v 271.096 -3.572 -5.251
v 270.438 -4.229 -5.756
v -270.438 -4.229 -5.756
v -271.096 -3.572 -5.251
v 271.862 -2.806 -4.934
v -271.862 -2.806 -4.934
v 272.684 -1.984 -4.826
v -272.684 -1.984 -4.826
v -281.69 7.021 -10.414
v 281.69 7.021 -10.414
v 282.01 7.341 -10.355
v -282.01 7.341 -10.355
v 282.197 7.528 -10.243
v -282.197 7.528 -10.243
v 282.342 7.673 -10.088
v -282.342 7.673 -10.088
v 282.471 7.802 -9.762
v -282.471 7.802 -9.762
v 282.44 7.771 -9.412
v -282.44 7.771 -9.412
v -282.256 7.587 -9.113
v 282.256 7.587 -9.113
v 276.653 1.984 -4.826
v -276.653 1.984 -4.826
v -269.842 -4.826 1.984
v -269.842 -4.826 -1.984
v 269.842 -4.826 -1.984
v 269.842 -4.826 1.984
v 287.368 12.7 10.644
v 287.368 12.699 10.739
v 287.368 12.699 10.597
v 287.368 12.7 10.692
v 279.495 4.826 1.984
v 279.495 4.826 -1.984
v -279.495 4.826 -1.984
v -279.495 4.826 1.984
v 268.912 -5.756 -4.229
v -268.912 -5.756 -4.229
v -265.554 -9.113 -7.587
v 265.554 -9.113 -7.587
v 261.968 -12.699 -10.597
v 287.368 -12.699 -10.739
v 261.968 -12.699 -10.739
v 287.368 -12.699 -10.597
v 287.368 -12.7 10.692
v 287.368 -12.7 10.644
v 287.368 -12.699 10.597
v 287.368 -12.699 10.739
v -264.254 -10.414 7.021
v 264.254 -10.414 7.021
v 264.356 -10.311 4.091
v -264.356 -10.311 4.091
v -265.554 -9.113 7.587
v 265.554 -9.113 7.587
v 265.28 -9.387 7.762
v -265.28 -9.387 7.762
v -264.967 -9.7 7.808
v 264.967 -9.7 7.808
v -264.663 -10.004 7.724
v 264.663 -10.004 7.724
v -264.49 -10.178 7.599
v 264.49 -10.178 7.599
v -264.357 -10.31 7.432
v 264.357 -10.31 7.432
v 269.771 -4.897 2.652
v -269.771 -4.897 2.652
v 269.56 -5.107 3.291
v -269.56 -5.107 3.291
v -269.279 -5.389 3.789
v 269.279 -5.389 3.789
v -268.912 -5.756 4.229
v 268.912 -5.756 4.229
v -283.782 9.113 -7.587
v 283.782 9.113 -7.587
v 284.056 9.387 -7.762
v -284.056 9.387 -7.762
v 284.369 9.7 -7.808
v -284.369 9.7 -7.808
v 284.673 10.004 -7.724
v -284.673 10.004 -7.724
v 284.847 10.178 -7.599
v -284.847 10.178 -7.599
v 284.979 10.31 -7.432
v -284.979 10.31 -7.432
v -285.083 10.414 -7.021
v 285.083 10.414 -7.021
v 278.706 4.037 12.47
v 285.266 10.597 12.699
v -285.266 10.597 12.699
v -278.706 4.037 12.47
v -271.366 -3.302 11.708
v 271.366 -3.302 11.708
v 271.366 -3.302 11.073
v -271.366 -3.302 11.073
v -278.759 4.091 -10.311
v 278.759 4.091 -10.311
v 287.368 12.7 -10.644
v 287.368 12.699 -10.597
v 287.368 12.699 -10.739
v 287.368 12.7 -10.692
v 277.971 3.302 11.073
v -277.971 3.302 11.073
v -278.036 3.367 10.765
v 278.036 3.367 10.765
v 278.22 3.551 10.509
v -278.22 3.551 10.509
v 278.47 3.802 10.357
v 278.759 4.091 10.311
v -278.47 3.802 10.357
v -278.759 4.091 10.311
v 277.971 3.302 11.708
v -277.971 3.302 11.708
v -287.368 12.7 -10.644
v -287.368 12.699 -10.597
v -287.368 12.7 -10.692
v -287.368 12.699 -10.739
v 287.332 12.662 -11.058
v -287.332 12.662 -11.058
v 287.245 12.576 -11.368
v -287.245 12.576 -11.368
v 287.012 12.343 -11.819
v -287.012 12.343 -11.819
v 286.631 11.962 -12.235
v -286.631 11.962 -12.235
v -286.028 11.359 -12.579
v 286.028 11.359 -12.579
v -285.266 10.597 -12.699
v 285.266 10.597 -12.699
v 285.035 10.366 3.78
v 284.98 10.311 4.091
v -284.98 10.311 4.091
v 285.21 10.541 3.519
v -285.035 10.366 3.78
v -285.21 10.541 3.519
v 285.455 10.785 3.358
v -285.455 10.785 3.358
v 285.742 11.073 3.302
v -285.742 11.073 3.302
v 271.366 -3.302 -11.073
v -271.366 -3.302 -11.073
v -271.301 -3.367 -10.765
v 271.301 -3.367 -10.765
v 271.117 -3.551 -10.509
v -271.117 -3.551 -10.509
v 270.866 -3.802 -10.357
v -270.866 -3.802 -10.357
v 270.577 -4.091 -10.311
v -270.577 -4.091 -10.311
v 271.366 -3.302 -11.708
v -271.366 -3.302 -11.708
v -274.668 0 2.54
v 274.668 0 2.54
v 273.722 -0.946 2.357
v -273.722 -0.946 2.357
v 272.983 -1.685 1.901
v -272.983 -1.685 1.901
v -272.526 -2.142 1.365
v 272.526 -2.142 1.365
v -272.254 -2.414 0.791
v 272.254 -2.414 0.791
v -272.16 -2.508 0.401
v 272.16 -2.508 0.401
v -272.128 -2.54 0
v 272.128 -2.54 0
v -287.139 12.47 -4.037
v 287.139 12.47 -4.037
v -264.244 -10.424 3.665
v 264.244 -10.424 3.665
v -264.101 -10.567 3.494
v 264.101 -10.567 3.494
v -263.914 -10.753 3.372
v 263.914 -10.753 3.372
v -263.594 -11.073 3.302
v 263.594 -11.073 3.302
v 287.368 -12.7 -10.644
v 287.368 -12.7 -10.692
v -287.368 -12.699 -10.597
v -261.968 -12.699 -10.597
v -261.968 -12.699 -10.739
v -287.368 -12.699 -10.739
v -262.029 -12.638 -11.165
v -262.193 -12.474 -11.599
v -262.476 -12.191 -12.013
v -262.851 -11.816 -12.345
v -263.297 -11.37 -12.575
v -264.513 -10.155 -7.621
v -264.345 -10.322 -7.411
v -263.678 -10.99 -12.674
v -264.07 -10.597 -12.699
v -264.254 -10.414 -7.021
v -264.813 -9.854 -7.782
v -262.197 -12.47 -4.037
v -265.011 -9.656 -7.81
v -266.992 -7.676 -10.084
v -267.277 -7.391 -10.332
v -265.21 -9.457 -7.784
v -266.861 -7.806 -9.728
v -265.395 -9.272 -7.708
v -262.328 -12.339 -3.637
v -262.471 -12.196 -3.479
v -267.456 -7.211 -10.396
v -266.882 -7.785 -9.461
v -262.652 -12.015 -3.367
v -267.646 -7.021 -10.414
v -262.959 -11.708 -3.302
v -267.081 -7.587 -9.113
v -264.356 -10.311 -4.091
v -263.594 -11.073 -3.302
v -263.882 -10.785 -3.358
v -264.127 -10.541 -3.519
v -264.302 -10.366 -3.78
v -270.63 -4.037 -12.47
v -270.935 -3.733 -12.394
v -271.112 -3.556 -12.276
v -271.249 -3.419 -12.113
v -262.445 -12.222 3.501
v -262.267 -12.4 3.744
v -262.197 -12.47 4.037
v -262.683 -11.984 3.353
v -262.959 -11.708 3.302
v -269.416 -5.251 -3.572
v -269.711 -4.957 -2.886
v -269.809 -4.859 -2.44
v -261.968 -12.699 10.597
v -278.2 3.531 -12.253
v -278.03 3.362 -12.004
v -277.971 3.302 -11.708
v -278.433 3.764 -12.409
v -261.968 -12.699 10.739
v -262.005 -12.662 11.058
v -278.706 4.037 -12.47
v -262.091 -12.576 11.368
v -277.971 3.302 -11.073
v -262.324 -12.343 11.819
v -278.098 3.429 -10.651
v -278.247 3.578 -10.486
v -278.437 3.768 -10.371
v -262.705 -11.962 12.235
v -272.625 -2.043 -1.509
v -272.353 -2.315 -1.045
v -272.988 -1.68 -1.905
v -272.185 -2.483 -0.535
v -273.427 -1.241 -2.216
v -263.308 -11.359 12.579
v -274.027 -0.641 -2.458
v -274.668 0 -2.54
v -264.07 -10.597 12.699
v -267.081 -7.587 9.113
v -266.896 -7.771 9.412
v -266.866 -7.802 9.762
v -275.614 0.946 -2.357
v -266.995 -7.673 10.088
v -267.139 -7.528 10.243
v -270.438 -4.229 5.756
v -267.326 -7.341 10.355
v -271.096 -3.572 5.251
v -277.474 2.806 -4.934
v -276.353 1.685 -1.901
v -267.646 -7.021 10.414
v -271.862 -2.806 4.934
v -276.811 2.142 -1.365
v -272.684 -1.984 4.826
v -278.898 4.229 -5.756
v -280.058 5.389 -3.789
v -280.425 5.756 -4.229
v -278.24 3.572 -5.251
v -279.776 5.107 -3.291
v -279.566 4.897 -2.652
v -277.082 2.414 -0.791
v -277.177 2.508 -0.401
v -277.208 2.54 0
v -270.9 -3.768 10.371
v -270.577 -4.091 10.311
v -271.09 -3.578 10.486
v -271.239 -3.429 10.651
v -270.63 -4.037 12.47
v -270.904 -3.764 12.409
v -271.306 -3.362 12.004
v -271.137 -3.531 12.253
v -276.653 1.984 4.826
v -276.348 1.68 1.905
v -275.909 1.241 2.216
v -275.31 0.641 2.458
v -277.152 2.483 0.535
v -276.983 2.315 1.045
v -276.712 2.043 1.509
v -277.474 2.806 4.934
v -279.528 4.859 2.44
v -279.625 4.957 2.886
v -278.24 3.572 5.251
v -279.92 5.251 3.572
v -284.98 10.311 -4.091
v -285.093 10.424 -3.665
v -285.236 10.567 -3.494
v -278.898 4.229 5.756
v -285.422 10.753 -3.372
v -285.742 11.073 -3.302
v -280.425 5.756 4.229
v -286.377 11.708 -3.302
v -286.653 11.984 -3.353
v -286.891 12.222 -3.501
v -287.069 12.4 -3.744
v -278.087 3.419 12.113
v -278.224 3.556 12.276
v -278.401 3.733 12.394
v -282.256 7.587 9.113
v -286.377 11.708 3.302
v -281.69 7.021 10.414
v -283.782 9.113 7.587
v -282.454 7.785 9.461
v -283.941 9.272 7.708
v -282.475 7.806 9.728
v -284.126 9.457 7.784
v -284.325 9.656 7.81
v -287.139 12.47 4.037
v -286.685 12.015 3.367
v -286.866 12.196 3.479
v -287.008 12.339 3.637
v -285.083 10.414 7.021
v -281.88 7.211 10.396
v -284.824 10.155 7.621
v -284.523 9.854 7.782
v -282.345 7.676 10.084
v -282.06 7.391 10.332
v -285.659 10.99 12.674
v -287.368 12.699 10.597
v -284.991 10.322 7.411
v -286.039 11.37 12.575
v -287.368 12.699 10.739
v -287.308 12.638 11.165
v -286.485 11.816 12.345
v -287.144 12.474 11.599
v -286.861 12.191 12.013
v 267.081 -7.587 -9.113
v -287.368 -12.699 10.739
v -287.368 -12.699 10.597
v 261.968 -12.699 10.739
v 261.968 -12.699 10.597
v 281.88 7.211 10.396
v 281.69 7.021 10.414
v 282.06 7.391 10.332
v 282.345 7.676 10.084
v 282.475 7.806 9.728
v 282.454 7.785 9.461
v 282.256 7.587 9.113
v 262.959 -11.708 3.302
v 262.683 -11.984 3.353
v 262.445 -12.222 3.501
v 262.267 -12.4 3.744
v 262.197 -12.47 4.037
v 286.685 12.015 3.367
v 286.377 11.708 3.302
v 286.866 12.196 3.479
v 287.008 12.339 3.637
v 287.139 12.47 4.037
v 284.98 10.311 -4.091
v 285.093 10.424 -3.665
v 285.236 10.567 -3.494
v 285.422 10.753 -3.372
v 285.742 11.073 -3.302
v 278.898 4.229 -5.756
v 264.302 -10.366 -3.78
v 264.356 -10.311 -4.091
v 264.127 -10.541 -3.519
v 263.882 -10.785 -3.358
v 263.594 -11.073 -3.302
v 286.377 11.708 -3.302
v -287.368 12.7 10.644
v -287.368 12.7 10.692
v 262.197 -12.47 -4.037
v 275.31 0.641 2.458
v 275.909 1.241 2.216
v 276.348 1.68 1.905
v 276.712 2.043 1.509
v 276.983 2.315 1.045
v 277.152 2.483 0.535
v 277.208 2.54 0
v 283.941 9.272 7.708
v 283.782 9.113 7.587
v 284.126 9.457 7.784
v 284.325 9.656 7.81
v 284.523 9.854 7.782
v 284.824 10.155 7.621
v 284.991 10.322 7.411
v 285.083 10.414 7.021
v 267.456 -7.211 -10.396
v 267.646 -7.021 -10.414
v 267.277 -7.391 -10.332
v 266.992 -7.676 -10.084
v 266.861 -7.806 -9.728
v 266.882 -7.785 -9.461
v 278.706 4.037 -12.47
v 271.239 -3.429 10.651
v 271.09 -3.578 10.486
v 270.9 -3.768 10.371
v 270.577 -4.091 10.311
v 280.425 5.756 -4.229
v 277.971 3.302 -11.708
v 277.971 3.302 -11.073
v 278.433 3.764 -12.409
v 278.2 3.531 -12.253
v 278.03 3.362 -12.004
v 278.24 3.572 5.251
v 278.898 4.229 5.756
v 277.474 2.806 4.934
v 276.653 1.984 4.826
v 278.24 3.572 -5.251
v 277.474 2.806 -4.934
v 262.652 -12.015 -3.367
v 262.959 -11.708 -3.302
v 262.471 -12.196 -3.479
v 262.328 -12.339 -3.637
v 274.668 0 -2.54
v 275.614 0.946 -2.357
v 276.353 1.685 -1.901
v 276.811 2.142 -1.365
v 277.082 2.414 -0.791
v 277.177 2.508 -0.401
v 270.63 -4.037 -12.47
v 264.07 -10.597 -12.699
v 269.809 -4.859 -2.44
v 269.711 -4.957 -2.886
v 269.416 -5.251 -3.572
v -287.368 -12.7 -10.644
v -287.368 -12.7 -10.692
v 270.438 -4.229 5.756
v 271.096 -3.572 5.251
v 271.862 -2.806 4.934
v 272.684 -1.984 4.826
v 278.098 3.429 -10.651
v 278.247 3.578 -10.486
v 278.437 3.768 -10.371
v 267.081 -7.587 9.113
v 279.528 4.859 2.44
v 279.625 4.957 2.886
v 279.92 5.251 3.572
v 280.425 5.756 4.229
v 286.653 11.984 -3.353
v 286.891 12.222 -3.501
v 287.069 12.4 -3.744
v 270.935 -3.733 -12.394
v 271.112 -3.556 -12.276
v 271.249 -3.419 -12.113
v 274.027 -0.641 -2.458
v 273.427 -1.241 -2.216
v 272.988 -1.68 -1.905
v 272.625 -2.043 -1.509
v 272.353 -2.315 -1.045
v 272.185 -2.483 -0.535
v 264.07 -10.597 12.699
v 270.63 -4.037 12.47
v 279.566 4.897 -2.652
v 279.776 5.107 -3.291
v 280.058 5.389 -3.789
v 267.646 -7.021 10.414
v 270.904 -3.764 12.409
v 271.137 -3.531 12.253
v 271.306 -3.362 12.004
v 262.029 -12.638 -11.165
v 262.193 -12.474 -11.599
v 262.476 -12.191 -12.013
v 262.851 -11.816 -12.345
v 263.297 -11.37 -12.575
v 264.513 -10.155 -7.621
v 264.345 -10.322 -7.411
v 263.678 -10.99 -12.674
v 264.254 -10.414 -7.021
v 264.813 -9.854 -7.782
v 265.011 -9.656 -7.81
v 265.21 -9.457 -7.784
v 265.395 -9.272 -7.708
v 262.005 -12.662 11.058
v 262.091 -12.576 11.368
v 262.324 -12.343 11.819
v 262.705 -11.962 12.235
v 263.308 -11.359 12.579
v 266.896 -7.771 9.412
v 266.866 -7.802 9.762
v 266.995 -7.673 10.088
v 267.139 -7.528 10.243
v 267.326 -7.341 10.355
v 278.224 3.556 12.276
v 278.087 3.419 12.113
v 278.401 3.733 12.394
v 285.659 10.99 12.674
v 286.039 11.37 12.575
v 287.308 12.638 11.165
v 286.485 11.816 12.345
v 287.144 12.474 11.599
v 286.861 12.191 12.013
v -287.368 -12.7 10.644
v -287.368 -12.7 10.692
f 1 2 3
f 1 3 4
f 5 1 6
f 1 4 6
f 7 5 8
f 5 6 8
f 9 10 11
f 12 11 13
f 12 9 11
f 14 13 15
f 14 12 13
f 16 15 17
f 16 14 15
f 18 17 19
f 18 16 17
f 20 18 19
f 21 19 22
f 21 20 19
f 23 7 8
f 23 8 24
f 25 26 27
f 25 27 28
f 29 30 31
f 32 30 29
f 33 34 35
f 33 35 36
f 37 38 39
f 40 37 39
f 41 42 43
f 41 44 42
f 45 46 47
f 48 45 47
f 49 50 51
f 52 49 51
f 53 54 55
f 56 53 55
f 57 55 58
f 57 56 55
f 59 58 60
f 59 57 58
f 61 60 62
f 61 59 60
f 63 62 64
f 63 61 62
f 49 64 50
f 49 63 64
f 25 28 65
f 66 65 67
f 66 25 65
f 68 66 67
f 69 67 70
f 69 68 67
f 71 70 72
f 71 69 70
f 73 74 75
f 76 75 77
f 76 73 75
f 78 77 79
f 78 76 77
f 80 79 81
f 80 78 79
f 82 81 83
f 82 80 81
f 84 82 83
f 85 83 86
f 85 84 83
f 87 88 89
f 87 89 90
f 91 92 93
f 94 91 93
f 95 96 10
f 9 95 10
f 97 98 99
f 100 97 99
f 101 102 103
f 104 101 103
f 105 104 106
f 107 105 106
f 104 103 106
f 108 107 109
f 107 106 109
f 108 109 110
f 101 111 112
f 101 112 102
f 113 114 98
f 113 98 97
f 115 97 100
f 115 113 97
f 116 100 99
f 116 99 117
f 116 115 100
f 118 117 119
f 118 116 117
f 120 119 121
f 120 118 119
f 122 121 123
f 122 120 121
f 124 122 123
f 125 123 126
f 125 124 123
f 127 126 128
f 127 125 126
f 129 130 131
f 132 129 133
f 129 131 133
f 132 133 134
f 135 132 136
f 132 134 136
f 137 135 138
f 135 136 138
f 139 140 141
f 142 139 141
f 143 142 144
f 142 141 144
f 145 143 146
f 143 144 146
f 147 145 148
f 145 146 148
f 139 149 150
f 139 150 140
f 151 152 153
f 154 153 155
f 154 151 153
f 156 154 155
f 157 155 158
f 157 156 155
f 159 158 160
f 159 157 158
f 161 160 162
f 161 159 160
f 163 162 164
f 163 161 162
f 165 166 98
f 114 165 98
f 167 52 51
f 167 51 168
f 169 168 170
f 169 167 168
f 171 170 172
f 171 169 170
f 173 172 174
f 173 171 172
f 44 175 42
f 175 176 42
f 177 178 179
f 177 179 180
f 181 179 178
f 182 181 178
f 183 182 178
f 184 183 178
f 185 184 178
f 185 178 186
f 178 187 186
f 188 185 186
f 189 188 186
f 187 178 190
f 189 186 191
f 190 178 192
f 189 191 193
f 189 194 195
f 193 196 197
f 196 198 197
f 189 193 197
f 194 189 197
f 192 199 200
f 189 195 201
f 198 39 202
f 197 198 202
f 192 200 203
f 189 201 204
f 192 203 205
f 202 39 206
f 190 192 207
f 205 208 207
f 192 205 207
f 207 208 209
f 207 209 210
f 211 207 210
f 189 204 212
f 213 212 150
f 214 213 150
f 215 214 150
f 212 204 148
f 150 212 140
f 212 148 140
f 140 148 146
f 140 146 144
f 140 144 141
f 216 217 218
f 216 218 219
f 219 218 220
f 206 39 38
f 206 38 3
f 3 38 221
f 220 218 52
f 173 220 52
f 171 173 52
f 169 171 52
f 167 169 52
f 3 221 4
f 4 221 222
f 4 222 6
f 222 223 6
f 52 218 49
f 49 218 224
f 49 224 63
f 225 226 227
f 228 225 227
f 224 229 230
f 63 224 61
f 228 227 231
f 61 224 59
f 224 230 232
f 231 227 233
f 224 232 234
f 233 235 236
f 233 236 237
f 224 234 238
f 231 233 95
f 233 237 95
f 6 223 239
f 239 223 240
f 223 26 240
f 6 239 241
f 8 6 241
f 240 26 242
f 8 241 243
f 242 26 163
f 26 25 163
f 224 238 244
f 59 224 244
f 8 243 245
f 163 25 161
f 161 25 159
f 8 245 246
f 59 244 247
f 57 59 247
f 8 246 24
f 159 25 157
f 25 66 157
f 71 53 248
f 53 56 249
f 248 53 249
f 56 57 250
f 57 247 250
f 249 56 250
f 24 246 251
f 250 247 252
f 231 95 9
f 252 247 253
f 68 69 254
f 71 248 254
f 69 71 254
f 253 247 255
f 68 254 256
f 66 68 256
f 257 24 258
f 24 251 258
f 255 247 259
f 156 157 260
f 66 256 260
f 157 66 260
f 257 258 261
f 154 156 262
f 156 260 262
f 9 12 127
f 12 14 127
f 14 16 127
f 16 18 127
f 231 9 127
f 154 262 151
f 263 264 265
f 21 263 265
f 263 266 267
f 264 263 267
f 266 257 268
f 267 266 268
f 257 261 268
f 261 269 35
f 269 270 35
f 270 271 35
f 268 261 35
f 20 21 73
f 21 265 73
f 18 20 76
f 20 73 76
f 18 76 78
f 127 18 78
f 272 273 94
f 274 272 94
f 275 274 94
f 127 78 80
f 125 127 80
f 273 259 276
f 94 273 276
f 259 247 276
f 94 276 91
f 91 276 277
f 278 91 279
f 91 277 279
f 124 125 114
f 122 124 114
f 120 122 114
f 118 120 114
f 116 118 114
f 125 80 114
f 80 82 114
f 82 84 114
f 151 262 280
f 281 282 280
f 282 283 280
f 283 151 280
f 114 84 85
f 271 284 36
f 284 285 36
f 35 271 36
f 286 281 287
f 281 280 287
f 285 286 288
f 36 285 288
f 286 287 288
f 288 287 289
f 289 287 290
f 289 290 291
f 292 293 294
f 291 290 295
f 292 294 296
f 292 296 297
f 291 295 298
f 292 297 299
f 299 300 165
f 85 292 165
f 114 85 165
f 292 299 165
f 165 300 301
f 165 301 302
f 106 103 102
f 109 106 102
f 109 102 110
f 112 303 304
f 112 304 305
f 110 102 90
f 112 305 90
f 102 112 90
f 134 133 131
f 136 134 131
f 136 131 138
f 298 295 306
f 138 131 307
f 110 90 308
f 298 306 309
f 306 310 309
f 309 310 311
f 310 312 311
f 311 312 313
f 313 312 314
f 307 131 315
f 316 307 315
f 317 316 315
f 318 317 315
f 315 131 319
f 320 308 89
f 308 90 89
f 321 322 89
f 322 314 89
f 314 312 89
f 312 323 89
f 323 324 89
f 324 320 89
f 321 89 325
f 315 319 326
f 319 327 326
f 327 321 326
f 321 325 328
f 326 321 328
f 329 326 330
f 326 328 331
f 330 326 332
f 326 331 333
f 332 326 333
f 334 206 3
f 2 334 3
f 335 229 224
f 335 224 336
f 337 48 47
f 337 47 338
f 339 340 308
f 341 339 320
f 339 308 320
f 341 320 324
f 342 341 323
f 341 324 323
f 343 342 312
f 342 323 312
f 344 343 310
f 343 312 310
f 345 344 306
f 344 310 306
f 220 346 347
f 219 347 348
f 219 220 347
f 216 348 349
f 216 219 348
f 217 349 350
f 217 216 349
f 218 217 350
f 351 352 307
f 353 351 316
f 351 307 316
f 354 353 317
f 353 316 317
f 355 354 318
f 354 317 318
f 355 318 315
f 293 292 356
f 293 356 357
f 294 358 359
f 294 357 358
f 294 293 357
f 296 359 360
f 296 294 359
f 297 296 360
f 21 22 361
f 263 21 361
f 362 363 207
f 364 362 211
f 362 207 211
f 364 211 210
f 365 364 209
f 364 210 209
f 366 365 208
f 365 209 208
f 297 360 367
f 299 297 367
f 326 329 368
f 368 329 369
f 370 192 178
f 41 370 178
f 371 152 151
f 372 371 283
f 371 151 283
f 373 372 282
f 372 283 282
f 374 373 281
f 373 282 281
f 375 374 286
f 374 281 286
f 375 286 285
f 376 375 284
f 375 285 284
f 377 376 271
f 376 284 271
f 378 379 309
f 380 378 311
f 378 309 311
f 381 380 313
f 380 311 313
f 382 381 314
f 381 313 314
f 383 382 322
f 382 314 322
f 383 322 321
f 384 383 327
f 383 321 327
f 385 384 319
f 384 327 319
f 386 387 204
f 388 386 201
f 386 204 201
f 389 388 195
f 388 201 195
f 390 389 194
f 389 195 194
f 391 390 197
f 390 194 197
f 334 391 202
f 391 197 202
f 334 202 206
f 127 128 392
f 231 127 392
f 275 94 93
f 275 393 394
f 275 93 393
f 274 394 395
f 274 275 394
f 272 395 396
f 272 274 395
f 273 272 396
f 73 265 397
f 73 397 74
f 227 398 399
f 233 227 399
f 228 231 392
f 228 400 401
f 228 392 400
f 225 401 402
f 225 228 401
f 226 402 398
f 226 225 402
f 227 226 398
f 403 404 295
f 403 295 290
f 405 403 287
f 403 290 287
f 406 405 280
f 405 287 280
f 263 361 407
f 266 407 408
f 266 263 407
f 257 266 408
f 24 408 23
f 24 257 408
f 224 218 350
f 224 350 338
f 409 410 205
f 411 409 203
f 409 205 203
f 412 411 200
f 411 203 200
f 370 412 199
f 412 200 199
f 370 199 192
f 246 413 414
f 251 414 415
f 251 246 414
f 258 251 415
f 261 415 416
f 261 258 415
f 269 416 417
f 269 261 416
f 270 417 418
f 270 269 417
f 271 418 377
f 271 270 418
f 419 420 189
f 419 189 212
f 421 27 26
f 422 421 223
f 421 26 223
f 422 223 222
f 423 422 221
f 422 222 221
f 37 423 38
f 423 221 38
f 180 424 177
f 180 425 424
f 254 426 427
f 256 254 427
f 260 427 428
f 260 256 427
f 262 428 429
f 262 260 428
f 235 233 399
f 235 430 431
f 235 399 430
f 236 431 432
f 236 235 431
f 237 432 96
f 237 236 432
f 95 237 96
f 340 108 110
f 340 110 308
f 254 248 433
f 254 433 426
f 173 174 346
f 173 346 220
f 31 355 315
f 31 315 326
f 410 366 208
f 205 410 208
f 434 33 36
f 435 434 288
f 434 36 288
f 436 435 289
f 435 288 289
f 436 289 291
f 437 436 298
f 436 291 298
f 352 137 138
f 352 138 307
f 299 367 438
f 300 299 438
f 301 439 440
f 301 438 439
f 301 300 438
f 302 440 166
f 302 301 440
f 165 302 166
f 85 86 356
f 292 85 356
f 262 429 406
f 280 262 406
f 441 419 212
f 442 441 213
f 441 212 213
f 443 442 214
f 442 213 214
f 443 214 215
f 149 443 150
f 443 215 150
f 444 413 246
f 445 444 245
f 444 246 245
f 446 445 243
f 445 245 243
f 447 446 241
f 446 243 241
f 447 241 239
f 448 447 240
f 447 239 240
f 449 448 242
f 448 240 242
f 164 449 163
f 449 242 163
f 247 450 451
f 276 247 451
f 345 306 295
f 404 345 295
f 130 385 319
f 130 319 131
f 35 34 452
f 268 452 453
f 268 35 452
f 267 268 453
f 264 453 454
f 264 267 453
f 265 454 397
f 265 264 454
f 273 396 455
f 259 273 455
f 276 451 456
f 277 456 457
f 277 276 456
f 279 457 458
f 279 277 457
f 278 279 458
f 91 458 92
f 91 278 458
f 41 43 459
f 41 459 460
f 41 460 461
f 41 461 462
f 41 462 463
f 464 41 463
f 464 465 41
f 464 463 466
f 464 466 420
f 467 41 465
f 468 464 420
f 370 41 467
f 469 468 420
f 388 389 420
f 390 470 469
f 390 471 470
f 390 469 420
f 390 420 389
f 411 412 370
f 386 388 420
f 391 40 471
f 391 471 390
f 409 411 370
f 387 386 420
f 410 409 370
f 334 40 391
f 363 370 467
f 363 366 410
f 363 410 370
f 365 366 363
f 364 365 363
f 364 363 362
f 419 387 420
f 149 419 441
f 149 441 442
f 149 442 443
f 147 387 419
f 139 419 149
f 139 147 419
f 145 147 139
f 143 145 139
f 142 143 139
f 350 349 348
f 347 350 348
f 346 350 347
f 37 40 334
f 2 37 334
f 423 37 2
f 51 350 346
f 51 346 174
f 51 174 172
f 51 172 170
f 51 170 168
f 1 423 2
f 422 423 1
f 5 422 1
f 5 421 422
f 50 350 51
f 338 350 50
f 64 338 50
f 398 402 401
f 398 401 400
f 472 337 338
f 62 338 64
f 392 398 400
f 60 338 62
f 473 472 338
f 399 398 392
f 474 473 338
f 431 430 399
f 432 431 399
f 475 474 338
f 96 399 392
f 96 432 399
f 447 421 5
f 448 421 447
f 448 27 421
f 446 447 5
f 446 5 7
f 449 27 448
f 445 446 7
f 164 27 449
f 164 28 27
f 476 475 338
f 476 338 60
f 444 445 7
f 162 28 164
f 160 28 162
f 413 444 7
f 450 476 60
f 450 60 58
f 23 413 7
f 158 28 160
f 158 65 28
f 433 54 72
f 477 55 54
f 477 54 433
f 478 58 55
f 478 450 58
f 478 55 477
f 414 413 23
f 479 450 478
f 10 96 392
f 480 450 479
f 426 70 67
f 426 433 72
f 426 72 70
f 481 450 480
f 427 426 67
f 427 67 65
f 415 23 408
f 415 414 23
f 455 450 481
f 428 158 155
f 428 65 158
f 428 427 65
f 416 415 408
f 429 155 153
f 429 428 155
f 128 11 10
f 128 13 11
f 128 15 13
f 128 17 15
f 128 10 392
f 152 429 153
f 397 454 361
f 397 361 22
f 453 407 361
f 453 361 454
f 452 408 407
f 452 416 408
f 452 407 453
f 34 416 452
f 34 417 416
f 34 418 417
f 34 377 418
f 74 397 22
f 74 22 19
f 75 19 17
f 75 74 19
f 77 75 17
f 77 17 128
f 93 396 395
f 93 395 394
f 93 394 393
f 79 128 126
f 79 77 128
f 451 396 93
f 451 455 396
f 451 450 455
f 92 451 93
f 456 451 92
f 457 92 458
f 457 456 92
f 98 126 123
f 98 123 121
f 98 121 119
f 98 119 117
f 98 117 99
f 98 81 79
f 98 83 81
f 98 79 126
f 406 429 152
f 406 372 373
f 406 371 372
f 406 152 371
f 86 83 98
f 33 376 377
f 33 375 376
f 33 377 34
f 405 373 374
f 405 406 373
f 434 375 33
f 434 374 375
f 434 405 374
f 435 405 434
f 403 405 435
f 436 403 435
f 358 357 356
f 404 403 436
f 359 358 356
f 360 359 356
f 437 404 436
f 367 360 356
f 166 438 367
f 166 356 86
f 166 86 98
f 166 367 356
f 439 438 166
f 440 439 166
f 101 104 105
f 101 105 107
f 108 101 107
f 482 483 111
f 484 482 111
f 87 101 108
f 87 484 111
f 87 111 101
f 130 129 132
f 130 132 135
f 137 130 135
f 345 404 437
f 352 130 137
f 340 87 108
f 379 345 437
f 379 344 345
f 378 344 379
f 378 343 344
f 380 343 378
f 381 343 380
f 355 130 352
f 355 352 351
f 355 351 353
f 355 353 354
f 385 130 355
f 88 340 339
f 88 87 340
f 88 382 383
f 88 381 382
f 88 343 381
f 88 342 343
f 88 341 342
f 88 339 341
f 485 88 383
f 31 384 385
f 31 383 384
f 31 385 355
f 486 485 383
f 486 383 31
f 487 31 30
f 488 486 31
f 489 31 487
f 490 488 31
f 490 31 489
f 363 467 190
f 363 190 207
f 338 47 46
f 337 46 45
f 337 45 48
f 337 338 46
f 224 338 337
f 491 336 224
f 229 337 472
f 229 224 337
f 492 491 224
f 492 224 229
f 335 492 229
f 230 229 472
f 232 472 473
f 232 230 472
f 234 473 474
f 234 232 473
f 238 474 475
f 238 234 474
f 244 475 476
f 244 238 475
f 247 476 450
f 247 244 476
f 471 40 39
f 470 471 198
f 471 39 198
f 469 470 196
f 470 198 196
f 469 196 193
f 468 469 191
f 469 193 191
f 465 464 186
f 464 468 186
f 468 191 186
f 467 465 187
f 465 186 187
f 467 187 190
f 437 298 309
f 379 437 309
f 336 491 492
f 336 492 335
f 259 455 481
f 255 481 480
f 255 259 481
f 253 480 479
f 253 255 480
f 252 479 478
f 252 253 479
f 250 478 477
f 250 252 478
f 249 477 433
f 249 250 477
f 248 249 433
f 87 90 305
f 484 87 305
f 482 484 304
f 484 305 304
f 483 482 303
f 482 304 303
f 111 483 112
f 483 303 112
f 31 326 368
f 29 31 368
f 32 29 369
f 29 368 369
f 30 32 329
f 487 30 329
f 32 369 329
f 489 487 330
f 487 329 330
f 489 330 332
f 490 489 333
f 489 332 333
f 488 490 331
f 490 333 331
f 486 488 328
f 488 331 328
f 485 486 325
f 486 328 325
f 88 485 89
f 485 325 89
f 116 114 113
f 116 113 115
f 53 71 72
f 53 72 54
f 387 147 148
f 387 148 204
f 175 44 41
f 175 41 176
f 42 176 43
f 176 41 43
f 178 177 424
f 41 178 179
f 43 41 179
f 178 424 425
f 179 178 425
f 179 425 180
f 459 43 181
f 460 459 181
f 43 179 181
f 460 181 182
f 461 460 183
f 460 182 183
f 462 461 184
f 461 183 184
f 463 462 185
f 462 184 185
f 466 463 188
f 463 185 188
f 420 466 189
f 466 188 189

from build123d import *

# Parameters (mm, degrees)
BOSS_EXTRUDE1_DEPTH      = 287.368196
BOSS_EXTRUDE1_DEPTH_BACK = 287.368196
CUT_EXTRUDE5_DEPTH       = 289.76784307
CUT_EXTRUDE5_DEPTH_BACK  = 289.76784307
CUT_EXTRUDE8_DEPTH       = 289.76784307
CUT_EXTRUDE8_DEPTH_BACK  = 289.76784307


with BuildPart() as part:
    # Sketch3 → Boss-Extrude1 (new, two sides: drawn at the far end of the back side and taken through both)
    with BuildSketch(Plane(origin=(0, 0, 0), x_dir=(0, 0, -1), z_dir=(1, 0, 0)).offset(-BOSS_EXTRUDE1_DEPTH_BACK)):
        with BuildLine():
            Line((0, 4.826), (1.984228399, 4.826))
            ThreePointArc((1.984228399, 4.826), (3.199248297, 5.067682484), (4.229292429, 5.75593597))
            Line((4.229292429, 5.75593597), (7.586577723, 9.113221264))
            ThreePointArc((7.586577723, 9.113221264), (7.746562132, 9.955883421), (7.021168939, 10.413572441))
            Line((7.021168939, 10.413572441), (4.090593416, 10.311234489))
            ThreePointArc((4.090593416, 10.311234489), (3.534670322, 10.524633371), (3.302, 11.072770299))
            Line((3.302, 11.072770299), (3.302, 11.70815736))
            ThreePointArc((3.302, 11.70815736), (3.515863072, 12.237487038), (4.037406584, 12.46969317))
            Line((4.037406584, 12.46969317), (10.597084223, 12.698762161))
            ThreePointArc((10.597084223, 12.698762161), (12.104840979, 12.104840979), (12.698762161, 10.597084223))
            Line((12.698762161, 10.597084223), (12.46969317, 4.037406584))
            ThreePointArc((12.46969317, 4.037406584), (12.237487038, 3.515863072), (11.70815736, 3.302))
            Line((11.70815736, 3.302), (11.072770299, 3.302))
            ThreePointArc((11.072770299, 3.302), (10.524633371, 3.534670322), (10.311234489, 4.090593416))
            Line((10.311234489, 4.090593416), (10.413572441, 7.021168939))
            ThreePointArc((10.413572441, 7.021168939), (9.955883421, 7.746562132), (9.113221264, 7.586577723))
            Line((9.113221264, 7.586577723), (5.75593597, 4.229292429))
            ThreePointArc((5.75593597, 4.229292429), (5.067682484, 3.199248297), (4.826, 1.984228399))
            Line((4.826, 1.984228399), (4.826, 0))
            Line((4.826, 0), (2.54, 0))
            ThreePointArc((2.54, 0), (1.796051224, 1.796051224), (0, 2.54))
            Line((0, 2.54), (0, 4.826))
        make_face()
    extrude(amount=BOSS_EXTRUDE1_DEPTH + BOSS_EXTRUDE1_DEPTH_BACK)

    # Mirror1: part across plane


with BuildPart() as part_1:
    add(part.part)
    add(part.part.mirror(Plane.ZX))

    # Mirror2: part across plane


with BuildPart() as part_2:
    add(part_1.part)
    add(part_1.part.mirror(Plane.XY))

    # Sketch6 → Cut-Extrude5 (cut, two sides: drawn at the far end of the back side and taken through both)
    with BuildSketch(Plane(origin=(0, 0, 12.698762161), x_dir=(-1, 0, 0), z_dir=(0, 0, -1)).offset(-CUT_EXTRUDE5_DEPTH_BACK)):
        Polygon((1447.962854837, -12.698762161), (287.3681959, -12.698762161), (261.9681959, -12.698762161), (287.3681959, 12.698762161), (1108.072544542, 833.323118656), (3261.939625853, 1698.641814545), (3601.829936148, 852.619933728), align=None)
    extrude(amount=CUT_EXTRUDE5_DEPTH + CUT_EXTRUDE5_DEPTH_BACK, mode=Mode.SUBTRACT)

    # Sketch12 → Cut-Extrude8 (cut, two sides: drawn at the far end of the back side and taken through both)
    with BuildSketch(Plane(origin=(0, 0, -12.698762161), x_dir=(-1, 0, 0), z_dir=(0, 0, -1)).offset(-CUT_EXTRUDE8_DEPTH_BACK)):
        Polygon((-1447.962854837, -12.698762161), (-287.3681959, -12.698762161), (-261.9681959, -12.698762161), (-287.3681959, 12.698762161), (-1108.072544542, 833.323118656), (-3261.939625853, 1698.641814545), (-3601.829936148, 852.619933728), align=None)
    extrude(amount=CUT_EXTRUDE8_DEPTH + CUT_EXTRUDE8_DEPTH_BACK, mode=Mode.SUBTRACT)


solid = part_2.part
